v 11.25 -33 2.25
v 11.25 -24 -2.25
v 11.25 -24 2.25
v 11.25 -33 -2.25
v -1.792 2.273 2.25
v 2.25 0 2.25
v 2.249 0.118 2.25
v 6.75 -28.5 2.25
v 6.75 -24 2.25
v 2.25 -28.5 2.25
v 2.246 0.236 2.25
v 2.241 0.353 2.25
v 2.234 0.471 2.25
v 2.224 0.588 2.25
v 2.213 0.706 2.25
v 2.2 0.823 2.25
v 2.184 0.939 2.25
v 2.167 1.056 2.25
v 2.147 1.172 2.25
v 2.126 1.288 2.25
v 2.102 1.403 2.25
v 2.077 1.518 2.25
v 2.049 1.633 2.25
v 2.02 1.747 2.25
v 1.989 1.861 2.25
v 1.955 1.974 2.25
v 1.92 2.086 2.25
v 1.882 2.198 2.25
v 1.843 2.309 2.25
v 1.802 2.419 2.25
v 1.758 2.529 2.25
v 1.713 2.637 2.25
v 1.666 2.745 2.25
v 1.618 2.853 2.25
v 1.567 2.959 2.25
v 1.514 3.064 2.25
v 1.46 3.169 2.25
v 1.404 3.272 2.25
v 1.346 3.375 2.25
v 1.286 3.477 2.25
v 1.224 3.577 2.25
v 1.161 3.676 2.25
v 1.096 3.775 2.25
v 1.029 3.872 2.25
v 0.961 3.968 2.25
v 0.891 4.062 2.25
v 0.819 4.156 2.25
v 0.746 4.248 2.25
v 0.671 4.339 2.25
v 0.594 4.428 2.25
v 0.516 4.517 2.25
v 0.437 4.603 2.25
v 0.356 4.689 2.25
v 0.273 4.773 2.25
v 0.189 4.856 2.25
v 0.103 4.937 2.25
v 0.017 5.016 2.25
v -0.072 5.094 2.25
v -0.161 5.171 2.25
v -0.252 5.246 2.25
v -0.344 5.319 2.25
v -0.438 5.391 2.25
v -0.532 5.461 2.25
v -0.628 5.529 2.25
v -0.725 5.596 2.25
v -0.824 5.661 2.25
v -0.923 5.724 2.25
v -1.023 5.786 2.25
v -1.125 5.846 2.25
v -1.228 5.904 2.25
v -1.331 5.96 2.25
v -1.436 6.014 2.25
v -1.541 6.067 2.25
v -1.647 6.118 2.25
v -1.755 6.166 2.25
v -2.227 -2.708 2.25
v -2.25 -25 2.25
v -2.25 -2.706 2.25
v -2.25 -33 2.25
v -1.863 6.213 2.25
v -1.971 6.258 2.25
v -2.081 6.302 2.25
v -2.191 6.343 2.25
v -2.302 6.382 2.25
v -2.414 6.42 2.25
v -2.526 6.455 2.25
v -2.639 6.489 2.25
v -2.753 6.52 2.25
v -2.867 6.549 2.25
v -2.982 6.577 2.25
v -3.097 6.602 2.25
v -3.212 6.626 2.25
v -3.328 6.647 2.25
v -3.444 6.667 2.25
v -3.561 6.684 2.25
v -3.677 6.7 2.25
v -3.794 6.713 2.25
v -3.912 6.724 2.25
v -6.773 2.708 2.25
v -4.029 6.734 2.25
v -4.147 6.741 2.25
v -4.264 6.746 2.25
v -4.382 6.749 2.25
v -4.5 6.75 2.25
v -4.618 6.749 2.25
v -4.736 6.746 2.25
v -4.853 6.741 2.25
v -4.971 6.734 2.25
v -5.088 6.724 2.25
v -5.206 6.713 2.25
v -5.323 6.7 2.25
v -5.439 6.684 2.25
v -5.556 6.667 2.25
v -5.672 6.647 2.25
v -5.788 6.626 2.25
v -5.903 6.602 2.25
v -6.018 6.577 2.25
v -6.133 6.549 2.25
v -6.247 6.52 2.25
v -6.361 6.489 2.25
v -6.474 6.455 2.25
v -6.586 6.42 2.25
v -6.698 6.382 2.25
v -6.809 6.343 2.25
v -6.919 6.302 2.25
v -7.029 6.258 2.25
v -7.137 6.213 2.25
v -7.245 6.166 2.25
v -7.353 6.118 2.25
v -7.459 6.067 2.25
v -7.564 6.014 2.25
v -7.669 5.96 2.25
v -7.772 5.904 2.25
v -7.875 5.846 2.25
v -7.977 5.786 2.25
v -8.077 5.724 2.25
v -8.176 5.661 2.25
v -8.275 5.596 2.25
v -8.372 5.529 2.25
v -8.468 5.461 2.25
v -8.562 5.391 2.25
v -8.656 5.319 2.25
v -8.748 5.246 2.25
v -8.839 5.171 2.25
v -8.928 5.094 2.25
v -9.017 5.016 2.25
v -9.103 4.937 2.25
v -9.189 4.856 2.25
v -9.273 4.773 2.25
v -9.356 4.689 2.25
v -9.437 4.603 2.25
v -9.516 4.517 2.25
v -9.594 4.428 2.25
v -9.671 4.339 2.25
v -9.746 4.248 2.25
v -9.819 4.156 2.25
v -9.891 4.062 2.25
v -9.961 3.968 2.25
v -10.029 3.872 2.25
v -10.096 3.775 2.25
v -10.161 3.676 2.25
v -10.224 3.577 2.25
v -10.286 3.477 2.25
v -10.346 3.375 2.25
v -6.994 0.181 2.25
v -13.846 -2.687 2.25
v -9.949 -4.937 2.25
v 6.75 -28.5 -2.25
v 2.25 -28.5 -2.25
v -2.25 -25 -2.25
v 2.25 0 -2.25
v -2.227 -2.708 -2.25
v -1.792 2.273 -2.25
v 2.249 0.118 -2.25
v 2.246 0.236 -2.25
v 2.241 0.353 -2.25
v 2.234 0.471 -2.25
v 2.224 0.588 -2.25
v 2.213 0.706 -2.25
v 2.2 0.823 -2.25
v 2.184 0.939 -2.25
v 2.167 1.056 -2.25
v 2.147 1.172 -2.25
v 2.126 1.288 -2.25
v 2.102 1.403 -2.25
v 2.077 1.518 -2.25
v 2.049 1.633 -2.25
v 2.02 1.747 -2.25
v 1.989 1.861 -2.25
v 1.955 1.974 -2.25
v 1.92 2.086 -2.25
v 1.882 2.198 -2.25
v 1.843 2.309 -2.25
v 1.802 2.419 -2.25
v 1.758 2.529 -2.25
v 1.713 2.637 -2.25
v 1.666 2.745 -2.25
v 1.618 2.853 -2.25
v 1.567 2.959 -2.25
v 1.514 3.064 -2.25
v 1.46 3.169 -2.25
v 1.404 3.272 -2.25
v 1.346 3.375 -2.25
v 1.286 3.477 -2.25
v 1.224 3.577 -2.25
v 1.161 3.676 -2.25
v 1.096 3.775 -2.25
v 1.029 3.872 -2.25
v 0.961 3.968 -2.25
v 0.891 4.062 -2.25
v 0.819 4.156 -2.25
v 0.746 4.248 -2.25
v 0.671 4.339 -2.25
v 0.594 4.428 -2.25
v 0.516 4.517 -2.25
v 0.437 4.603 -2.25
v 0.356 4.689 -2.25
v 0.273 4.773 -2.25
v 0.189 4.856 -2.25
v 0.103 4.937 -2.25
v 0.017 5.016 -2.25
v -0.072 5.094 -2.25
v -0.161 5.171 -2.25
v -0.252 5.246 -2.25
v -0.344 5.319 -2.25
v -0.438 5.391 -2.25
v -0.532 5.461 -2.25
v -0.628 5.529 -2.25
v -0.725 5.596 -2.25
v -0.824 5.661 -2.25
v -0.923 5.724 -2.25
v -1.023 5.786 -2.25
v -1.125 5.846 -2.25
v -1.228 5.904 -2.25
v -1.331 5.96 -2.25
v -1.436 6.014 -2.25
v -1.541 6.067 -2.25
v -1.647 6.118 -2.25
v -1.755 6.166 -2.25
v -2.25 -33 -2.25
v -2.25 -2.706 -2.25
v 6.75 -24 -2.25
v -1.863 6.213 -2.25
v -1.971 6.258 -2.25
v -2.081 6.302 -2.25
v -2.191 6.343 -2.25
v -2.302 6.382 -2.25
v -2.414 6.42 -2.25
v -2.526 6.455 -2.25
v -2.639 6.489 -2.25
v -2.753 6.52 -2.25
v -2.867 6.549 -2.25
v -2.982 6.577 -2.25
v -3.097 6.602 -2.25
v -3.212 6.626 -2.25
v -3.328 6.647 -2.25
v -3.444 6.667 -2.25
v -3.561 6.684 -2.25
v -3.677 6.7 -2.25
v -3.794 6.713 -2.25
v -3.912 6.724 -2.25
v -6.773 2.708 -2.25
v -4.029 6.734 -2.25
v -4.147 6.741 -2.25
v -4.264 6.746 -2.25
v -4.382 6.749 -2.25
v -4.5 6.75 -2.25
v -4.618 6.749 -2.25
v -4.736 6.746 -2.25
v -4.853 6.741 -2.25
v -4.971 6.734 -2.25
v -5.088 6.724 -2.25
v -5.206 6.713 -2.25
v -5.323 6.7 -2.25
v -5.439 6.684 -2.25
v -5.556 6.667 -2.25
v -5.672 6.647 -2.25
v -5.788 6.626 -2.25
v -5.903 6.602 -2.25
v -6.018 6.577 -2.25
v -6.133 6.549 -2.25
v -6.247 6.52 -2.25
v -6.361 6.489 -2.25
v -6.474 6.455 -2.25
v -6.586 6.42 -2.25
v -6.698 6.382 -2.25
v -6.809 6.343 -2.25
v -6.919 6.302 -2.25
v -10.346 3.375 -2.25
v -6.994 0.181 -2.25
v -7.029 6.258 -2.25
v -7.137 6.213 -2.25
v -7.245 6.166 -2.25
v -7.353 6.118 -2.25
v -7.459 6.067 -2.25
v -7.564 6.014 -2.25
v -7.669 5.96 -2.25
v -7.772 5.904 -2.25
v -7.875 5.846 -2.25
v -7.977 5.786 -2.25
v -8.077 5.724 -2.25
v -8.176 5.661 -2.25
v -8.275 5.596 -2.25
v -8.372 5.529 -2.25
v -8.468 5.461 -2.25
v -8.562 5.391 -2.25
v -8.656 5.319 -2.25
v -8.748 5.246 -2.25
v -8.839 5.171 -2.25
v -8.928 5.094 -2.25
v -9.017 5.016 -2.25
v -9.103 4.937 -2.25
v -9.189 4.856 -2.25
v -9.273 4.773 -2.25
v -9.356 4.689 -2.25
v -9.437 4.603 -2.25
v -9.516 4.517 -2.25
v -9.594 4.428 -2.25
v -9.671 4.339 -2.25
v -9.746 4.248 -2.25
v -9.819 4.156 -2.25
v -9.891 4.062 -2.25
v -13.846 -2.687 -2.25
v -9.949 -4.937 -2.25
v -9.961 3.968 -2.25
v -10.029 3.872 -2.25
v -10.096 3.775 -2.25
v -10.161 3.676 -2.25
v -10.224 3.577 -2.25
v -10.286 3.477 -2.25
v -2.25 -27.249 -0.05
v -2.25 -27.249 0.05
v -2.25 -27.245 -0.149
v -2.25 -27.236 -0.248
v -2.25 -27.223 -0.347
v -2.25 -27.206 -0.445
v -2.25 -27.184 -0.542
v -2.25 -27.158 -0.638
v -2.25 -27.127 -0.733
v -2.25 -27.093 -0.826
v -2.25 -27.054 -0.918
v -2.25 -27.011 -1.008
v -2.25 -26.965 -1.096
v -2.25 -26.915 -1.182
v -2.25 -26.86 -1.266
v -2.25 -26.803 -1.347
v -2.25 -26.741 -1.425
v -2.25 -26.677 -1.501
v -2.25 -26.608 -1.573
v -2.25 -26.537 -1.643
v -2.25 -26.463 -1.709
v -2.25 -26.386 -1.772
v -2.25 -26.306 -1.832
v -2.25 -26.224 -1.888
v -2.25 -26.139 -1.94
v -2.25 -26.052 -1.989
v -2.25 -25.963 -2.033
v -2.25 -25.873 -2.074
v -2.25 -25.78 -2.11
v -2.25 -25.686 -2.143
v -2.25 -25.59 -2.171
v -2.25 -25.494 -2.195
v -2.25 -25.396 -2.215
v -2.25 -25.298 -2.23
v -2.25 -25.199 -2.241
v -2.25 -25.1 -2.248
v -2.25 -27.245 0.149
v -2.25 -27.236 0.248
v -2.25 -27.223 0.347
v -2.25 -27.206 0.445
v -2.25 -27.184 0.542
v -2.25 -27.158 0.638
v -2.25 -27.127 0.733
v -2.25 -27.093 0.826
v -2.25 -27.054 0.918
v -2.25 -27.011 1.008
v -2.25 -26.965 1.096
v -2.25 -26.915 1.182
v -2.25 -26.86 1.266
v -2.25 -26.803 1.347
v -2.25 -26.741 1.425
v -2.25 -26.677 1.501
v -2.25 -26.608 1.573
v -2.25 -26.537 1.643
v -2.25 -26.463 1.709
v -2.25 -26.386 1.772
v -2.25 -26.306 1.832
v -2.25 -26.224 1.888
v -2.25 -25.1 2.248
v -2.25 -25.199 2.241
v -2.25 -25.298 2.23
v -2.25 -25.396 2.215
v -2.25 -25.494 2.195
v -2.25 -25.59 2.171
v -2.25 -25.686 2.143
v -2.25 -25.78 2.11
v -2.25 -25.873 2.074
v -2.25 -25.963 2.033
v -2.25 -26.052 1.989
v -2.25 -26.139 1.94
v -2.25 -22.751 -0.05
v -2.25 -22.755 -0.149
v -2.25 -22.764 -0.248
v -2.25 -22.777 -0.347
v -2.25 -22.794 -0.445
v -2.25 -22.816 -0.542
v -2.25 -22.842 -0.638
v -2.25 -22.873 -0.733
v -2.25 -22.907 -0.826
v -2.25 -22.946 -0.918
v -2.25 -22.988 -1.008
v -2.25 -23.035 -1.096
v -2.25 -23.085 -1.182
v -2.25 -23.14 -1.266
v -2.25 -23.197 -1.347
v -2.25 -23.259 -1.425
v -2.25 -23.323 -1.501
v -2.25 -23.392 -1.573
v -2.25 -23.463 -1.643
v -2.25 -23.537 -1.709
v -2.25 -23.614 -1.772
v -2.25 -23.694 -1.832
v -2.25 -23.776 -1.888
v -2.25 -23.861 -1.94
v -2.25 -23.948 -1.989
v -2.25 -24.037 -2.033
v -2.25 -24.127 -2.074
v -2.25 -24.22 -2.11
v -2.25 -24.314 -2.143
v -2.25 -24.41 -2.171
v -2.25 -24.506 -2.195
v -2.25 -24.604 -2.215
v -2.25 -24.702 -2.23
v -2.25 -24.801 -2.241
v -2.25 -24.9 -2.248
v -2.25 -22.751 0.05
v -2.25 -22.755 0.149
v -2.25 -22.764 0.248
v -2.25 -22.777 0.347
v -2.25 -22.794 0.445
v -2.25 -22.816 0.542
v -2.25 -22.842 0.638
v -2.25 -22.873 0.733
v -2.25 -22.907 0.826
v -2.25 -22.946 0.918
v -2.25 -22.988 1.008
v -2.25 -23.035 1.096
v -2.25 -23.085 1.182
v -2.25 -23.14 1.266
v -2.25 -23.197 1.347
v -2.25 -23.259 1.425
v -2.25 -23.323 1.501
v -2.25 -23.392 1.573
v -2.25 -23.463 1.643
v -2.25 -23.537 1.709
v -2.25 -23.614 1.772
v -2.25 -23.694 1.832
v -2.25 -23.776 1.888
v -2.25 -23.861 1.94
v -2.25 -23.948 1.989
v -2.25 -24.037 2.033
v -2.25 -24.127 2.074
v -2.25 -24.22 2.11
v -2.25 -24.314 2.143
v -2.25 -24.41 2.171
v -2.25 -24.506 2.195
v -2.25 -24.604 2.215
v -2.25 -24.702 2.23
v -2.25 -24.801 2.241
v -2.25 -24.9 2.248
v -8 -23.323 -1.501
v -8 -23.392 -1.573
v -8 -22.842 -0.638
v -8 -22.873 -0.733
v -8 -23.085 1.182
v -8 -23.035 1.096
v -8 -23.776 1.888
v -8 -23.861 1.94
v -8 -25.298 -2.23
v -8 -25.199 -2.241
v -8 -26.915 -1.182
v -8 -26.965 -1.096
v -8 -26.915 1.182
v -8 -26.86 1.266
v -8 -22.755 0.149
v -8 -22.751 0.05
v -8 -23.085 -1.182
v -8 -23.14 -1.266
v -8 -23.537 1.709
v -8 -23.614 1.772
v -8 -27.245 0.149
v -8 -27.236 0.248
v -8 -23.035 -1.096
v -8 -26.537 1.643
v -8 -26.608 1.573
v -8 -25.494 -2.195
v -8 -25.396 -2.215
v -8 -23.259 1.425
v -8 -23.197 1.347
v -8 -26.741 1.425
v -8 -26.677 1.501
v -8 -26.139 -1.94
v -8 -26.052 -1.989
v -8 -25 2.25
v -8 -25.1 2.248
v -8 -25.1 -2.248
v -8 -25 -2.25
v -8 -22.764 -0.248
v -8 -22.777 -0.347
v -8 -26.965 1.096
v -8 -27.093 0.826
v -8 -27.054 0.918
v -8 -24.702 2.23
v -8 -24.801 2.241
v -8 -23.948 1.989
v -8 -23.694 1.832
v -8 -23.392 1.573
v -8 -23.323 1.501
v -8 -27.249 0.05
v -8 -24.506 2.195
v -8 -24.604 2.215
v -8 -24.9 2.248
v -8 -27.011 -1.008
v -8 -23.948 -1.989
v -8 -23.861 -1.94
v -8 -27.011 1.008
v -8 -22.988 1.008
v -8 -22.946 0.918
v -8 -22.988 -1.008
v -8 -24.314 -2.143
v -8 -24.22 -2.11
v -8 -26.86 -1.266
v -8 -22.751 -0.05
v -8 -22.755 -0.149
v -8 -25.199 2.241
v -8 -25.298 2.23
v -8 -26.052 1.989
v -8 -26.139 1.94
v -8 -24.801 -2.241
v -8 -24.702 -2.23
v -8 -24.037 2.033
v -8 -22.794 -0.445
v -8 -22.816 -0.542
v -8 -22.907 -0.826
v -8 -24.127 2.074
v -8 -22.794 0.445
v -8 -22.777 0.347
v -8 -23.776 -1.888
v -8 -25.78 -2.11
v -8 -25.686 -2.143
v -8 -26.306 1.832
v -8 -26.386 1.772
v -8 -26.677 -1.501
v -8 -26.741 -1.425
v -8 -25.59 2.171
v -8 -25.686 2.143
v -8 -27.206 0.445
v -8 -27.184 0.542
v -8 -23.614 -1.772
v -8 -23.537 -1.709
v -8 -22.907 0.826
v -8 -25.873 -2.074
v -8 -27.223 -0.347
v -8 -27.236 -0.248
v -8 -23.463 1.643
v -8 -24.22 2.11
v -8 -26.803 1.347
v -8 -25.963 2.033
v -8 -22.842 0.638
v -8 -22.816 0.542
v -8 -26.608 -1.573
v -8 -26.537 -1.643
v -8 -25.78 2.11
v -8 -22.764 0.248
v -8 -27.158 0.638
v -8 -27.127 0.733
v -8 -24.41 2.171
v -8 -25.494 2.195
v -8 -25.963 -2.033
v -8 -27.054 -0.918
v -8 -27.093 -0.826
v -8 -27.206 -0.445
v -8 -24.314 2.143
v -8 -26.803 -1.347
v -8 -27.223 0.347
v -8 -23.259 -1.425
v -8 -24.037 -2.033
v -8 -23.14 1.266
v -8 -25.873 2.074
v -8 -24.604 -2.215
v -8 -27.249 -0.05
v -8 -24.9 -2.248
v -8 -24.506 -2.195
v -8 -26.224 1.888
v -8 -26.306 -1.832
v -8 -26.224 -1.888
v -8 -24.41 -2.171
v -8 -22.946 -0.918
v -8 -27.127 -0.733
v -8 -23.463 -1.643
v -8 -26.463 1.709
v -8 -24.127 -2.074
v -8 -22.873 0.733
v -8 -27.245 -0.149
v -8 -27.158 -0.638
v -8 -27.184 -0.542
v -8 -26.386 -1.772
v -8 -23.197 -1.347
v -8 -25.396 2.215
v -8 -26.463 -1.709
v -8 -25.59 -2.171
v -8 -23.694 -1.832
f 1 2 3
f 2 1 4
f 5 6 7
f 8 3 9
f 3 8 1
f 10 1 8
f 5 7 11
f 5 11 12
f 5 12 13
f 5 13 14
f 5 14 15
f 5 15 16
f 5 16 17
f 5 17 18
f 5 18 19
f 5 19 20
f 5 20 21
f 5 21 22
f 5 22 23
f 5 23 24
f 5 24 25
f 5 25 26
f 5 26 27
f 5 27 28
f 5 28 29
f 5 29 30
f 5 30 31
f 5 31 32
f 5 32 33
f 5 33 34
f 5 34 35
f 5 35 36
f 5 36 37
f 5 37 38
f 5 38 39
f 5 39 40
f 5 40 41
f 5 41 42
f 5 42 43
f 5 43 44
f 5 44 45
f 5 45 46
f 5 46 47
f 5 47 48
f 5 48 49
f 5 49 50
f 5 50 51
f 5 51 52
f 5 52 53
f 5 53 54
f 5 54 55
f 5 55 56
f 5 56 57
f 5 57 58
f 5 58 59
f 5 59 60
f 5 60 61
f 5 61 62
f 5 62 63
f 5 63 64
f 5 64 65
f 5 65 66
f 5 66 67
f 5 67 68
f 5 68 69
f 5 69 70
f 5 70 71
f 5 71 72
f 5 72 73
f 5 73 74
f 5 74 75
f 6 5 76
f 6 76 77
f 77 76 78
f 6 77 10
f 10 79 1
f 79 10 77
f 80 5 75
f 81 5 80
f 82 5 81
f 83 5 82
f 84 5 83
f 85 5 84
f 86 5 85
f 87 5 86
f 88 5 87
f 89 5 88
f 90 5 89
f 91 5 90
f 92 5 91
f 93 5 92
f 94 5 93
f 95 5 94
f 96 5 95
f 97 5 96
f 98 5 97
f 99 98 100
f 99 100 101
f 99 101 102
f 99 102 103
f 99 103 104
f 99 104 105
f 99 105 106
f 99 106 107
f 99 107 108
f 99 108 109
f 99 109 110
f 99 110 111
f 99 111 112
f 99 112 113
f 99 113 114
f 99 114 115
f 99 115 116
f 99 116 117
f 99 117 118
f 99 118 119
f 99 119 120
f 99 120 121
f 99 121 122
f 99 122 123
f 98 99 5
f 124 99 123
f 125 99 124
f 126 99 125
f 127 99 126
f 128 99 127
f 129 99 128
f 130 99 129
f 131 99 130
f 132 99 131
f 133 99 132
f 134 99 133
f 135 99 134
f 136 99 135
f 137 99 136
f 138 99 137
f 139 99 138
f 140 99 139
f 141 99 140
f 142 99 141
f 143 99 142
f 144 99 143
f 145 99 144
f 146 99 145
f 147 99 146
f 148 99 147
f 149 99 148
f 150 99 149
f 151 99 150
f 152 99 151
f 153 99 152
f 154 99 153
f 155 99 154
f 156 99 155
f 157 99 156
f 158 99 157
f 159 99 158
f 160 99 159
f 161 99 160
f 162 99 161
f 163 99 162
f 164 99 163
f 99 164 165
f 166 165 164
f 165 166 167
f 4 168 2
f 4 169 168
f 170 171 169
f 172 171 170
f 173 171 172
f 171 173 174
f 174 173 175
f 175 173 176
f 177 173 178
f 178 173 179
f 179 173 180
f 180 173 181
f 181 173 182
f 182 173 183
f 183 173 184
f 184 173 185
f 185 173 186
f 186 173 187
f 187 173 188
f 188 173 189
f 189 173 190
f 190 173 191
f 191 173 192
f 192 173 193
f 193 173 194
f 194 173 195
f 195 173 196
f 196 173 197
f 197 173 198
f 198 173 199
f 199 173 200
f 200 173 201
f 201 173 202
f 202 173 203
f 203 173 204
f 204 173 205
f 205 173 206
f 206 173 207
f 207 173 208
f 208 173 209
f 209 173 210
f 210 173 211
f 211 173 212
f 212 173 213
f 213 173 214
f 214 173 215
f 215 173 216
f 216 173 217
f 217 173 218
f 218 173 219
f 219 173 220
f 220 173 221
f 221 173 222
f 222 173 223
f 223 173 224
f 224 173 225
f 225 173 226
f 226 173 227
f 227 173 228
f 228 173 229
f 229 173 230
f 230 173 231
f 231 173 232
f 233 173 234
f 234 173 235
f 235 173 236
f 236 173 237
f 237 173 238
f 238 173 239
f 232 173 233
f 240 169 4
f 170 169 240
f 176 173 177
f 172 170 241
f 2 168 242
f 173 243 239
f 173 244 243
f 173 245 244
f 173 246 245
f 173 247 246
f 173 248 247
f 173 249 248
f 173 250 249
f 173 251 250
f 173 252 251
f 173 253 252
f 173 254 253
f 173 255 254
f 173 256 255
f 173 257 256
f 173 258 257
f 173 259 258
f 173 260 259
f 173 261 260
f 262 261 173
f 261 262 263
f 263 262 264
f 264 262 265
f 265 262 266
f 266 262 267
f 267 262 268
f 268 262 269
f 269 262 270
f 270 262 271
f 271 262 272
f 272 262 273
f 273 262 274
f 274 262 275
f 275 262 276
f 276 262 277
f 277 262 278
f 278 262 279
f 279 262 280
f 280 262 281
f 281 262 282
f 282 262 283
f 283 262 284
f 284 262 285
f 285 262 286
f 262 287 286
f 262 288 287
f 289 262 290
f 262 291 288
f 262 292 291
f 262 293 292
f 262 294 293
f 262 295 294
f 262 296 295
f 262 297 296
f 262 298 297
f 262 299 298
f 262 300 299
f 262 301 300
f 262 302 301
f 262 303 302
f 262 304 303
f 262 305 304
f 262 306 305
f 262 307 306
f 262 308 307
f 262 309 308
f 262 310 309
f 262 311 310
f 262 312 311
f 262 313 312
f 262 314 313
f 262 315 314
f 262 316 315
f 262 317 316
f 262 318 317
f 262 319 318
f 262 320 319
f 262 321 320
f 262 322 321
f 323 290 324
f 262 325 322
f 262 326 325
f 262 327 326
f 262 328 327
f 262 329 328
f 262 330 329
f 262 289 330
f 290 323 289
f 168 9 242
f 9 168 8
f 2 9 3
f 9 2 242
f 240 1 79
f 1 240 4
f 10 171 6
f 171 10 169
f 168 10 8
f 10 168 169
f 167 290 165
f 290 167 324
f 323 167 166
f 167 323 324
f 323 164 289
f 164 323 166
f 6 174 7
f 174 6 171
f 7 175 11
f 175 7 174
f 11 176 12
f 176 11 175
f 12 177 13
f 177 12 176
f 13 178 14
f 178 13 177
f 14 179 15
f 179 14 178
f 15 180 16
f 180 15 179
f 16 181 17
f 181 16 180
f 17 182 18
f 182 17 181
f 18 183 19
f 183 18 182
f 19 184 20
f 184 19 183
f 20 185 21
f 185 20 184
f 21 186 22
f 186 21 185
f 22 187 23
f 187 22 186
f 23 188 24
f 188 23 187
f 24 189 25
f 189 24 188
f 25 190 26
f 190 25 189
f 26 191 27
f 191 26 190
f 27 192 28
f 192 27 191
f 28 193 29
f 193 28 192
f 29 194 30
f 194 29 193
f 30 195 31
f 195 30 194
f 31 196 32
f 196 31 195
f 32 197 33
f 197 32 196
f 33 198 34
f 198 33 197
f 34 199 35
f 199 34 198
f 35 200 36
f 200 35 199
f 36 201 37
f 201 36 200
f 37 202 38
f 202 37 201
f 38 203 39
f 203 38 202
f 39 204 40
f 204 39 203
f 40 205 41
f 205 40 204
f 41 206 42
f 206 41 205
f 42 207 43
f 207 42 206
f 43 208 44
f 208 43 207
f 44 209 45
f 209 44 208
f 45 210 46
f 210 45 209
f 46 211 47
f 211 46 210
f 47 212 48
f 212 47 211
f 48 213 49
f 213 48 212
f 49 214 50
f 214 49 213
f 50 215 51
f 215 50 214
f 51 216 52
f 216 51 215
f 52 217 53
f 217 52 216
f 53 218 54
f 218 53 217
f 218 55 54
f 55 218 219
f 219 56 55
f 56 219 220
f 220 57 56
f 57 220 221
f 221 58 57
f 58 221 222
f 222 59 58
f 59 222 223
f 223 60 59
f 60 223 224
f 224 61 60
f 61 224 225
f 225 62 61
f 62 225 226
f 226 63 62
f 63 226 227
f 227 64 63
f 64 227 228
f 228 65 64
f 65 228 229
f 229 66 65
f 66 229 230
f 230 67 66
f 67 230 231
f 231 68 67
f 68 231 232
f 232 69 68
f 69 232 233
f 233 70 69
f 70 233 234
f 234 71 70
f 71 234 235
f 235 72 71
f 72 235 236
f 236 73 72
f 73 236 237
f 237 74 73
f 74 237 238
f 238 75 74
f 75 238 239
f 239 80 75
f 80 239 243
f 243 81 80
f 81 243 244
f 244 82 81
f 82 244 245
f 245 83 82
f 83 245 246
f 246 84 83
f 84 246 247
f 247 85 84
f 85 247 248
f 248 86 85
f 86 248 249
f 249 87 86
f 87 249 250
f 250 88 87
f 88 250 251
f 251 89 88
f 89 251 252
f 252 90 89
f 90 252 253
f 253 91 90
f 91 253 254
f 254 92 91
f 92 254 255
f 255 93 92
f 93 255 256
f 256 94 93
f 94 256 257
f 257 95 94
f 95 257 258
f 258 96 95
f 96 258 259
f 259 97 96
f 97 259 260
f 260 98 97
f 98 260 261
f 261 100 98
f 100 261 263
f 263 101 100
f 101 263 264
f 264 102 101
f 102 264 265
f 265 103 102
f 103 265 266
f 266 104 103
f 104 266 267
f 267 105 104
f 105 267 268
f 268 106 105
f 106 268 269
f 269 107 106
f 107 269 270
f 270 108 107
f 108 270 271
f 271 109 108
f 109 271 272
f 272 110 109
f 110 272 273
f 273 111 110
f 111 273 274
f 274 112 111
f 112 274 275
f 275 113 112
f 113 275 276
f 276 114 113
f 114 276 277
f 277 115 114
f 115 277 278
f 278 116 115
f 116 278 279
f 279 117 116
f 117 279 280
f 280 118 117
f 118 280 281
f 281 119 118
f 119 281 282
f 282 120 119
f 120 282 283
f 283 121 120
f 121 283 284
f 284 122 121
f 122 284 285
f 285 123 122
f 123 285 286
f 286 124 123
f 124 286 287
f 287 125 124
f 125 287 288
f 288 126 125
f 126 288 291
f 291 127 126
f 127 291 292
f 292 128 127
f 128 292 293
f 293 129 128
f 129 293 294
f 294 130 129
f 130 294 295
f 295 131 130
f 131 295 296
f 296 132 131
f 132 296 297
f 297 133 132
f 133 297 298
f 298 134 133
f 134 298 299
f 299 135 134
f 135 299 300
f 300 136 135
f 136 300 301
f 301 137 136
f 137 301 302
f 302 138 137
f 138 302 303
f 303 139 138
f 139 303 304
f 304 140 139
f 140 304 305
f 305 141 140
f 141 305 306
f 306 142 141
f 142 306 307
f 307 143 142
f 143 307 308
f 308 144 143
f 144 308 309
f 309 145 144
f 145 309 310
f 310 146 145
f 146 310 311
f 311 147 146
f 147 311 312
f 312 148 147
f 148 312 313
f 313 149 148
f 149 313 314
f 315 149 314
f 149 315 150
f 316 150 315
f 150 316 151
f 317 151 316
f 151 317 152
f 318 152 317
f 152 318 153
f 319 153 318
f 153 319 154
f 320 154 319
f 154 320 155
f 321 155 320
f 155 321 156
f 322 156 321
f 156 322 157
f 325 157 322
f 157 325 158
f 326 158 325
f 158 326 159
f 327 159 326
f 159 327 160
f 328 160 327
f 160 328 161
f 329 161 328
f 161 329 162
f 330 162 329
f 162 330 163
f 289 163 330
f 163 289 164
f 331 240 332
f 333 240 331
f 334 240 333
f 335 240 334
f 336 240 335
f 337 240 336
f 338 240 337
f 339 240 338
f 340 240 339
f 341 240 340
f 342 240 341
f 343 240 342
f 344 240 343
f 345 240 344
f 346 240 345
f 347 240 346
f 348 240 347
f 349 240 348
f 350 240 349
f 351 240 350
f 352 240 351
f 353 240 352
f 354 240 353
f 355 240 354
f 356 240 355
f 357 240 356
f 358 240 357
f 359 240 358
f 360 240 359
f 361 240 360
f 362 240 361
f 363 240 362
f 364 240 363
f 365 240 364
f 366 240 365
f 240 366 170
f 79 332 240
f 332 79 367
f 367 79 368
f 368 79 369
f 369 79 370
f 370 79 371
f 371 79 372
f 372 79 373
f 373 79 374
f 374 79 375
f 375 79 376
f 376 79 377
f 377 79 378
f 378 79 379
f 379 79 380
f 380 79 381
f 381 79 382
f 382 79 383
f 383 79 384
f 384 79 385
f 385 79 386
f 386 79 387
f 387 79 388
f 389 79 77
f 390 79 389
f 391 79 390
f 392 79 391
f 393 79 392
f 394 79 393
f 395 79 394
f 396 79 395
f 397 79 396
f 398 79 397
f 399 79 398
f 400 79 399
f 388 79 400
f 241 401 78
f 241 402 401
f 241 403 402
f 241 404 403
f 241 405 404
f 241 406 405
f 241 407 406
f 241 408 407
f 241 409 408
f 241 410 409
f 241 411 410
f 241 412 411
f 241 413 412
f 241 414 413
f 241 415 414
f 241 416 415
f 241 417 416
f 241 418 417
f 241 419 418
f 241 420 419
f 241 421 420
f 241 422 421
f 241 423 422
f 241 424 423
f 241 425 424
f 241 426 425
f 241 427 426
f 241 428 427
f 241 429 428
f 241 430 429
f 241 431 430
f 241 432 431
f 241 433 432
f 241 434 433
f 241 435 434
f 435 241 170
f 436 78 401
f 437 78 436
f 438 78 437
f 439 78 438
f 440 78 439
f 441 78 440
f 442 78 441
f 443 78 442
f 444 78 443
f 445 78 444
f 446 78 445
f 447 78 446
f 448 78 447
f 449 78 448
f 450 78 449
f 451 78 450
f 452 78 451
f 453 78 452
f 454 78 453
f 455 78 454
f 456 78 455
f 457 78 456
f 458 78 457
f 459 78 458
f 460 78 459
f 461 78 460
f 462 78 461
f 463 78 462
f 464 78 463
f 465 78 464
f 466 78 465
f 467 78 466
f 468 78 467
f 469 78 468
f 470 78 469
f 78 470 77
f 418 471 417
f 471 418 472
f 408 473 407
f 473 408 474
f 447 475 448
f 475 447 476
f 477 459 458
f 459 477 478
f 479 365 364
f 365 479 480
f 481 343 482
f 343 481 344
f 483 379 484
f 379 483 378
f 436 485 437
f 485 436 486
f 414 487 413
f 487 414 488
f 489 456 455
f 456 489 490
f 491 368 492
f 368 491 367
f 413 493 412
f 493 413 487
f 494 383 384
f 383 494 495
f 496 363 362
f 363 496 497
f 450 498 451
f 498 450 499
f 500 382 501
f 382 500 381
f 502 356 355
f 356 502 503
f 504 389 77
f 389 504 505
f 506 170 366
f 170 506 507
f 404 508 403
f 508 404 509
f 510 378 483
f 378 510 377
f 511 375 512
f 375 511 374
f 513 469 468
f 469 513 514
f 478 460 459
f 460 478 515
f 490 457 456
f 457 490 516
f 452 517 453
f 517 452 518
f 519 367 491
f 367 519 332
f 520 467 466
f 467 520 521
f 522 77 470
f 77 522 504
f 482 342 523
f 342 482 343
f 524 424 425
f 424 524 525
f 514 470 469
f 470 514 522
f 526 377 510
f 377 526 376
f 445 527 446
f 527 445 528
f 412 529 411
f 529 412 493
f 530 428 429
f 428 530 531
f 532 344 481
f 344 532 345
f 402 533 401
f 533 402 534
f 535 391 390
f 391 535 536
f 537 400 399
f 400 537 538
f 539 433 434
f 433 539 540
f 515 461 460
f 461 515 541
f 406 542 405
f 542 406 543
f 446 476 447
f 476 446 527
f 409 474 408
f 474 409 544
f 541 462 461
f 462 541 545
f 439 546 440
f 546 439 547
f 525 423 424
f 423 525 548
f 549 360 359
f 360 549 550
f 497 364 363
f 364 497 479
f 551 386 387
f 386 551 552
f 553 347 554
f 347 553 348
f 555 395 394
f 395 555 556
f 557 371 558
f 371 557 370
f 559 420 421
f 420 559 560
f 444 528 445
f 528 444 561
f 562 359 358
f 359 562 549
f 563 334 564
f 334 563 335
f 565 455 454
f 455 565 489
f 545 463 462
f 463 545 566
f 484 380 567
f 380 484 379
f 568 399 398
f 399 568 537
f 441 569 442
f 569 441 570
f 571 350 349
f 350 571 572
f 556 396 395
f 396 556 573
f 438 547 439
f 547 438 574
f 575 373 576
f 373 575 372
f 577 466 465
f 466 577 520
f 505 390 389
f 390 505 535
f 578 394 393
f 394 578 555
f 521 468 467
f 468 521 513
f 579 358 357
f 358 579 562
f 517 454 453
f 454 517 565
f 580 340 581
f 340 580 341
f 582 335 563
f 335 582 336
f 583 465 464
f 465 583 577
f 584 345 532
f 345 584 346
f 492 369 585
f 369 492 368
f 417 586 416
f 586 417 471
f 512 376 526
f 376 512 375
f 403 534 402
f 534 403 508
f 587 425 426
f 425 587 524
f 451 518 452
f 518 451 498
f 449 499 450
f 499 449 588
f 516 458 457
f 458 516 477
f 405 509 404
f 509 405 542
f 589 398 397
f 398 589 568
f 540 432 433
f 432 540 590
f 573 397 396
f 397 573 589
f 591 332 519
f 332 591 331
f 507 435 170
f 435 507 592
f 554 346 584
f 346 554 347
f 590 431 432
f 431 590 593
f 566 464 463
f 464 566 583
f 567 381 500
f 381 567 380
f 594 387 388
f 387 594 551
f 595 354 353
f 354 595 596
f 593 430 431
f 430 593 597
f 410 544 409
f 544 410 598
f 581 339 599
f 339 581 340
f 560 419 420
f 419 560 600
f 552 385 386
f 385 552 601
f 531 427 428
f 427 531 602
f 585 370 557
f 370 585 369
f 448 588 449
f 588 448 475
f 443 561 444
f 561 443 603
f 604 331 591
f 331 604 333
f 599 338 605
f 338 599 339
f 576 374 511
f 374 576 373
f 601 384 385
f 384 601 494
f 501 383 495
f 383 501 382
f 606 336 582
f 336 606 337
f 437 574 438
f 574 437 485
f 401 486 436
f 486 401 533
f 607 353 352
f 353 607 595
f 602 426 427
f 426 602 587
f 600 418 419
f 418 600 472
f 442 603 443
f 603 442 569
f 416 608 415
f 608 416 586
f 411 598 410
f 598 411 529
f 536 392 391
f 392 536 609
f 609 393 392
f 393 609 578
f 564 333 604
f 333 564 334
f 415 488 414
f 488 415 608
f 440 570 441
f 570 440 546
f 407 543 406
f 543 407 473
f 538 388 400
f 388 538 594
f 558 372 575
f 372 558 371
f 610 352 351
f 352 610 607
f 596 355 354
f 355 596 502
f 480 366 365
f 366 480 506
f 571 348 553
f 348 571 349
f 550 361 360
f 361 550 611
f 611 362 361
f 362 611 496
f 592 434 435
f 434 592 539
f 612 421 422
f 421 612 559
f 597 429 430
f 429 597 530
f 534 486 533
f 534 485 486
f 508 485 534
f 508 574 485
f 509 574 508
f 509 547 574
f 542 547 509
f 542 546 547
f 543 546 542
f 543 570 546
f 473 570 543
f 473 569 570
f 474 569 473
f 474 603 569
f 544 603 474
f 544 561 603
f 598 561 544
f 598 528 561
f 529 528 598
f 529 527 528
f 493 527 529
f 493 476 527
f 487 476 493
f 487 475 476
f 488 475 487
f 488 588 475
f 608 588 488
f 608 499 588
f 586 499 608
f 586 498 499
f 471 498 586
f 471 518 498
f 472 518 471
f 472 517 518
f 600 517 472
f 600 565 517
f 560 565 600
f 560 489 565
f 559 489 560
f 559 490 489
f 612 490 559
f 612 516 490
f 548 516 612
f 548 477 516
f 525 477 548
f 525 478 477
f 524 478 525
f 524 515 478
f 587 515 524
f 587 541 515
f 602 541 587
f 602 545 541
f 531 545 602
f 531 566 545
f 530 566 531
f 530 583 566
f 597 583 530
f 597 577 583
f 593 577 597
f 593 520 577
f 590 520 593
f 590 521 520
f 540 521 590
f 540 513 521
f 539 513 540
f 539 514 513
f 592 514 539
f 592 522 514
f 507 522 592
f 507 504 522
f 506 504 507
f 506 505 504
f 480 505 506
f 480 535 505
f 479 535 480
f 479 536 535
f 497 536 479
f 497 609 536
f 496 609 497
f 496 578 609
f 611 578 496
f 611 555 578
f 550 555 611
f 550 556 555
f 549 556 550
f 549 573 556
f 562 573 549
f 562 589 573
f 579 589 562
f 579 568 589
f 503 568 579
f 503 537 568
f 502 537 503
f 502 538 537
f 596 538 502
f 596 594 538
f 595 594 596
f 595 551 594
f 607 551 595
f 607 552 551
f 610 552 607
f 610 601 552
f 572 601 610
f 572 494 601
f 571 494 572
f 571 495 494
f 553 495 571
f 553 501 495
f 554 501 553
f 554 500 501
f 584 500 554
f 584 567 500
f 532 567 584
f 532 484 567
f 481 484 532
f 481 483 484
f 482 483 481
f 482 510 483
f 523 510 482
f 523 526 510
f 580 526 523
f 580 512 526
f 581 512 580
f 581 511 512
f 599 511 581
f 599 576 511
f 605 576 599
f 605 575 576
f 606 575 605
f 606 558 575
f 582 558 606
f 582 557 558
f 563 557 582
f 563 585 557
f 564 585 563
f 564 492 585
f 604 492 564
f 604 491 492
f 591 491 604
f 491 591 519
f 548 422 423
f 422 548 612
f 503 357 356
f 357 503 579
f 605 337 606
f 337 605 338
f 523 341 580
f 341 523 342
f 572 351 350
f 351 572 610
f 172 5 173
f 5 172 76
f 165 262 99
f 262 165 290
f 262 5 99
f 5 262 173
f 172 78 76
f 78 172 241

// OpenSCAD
$fa = 1;
$fs = 0.1;

module AttachmentRound() {
    hookRotationAngle = 150;
    hookRotationRadius = 4.5;
    hookLength = 7;
    bodyLength = 33;
    hookDiameter = 4.5;
    cuttoutWidth = 5;
    
    difference() {
        // Hook shape
        union(){
            translate([-hookRotationRadius,0])
            rotate([90,0,hookRotationAngle])
            translate([hookRotationRadius,0,-hookLength])
            cylinder(h=hookLength, d=hookDiameter);

            translate([-hookRotationRadius,0])
            rotate_extrude(angle=hookRotationAngle, convexity=10)
            translate([hookRotationRadius,0]) circle(d=hookDiameter);

            rotate([90,0,0])
            cylinder(h=bodyLength, d=hookDiameter);

            translate([0,-25,0])
            rotate([0,-90,0])
            cylinder(h=8, d=hookDiameter);
        }
        
        // Square cuttout 
        translate([-hookRotationRadius,,0])
        rotate([0,0,-5])
        cube(cuttoutWidth, center=true);
    }
}
    
module AttachmentSquare() {
    hookRotationAngle = 150;
    hookRotationRadius = 4.5;
    hookLength = 7;
    bodyLength = 33;
    hookWidth = 4.5;
    cuttoutWidth = 5;
    
    difference() {
        // Hook shape
        union(){
            translate([-hookRotationRadius,0,0])
            rotate([0,0,hookRotationAngle])
            translate([hookRotationRadius,0,0])
            translate([0,hookLength/2,0])
            cube([hookWidth, hookLength, hookWidth], center=true);

            translate([-hookRotationRadius,0])
            rotate_extrude(angle=hookRotationAngle, convexity=10)
            translate([hookRotationRadius,0]) square(hookWidth, center=true);
           
            translate([0,-bodyLength/2])
            cube([hookWidth, 33, hookWidth], center = true);
  
            translate([0,-25,0])
            rotate([0,-90,0])
            cylinder(h=8, d=hookWidth);
            
            translate([hookWidth/2,-bodyLength,-hookWidth/2])
            union(){
                translate([hookWidth,0,0])
                cube([hookWidth,2*hookWidth, hookWidth]);
                cube([2*hookWidth,hookWidth, hookWidth]);
            }
        }
            
        // Square cuttout
        translate([-hookRotationRadius,,0])
        rotate([0,0,-5])
        cube(cuttoutWidth, center=true);
    }
}
    
AttachmentSquare();
